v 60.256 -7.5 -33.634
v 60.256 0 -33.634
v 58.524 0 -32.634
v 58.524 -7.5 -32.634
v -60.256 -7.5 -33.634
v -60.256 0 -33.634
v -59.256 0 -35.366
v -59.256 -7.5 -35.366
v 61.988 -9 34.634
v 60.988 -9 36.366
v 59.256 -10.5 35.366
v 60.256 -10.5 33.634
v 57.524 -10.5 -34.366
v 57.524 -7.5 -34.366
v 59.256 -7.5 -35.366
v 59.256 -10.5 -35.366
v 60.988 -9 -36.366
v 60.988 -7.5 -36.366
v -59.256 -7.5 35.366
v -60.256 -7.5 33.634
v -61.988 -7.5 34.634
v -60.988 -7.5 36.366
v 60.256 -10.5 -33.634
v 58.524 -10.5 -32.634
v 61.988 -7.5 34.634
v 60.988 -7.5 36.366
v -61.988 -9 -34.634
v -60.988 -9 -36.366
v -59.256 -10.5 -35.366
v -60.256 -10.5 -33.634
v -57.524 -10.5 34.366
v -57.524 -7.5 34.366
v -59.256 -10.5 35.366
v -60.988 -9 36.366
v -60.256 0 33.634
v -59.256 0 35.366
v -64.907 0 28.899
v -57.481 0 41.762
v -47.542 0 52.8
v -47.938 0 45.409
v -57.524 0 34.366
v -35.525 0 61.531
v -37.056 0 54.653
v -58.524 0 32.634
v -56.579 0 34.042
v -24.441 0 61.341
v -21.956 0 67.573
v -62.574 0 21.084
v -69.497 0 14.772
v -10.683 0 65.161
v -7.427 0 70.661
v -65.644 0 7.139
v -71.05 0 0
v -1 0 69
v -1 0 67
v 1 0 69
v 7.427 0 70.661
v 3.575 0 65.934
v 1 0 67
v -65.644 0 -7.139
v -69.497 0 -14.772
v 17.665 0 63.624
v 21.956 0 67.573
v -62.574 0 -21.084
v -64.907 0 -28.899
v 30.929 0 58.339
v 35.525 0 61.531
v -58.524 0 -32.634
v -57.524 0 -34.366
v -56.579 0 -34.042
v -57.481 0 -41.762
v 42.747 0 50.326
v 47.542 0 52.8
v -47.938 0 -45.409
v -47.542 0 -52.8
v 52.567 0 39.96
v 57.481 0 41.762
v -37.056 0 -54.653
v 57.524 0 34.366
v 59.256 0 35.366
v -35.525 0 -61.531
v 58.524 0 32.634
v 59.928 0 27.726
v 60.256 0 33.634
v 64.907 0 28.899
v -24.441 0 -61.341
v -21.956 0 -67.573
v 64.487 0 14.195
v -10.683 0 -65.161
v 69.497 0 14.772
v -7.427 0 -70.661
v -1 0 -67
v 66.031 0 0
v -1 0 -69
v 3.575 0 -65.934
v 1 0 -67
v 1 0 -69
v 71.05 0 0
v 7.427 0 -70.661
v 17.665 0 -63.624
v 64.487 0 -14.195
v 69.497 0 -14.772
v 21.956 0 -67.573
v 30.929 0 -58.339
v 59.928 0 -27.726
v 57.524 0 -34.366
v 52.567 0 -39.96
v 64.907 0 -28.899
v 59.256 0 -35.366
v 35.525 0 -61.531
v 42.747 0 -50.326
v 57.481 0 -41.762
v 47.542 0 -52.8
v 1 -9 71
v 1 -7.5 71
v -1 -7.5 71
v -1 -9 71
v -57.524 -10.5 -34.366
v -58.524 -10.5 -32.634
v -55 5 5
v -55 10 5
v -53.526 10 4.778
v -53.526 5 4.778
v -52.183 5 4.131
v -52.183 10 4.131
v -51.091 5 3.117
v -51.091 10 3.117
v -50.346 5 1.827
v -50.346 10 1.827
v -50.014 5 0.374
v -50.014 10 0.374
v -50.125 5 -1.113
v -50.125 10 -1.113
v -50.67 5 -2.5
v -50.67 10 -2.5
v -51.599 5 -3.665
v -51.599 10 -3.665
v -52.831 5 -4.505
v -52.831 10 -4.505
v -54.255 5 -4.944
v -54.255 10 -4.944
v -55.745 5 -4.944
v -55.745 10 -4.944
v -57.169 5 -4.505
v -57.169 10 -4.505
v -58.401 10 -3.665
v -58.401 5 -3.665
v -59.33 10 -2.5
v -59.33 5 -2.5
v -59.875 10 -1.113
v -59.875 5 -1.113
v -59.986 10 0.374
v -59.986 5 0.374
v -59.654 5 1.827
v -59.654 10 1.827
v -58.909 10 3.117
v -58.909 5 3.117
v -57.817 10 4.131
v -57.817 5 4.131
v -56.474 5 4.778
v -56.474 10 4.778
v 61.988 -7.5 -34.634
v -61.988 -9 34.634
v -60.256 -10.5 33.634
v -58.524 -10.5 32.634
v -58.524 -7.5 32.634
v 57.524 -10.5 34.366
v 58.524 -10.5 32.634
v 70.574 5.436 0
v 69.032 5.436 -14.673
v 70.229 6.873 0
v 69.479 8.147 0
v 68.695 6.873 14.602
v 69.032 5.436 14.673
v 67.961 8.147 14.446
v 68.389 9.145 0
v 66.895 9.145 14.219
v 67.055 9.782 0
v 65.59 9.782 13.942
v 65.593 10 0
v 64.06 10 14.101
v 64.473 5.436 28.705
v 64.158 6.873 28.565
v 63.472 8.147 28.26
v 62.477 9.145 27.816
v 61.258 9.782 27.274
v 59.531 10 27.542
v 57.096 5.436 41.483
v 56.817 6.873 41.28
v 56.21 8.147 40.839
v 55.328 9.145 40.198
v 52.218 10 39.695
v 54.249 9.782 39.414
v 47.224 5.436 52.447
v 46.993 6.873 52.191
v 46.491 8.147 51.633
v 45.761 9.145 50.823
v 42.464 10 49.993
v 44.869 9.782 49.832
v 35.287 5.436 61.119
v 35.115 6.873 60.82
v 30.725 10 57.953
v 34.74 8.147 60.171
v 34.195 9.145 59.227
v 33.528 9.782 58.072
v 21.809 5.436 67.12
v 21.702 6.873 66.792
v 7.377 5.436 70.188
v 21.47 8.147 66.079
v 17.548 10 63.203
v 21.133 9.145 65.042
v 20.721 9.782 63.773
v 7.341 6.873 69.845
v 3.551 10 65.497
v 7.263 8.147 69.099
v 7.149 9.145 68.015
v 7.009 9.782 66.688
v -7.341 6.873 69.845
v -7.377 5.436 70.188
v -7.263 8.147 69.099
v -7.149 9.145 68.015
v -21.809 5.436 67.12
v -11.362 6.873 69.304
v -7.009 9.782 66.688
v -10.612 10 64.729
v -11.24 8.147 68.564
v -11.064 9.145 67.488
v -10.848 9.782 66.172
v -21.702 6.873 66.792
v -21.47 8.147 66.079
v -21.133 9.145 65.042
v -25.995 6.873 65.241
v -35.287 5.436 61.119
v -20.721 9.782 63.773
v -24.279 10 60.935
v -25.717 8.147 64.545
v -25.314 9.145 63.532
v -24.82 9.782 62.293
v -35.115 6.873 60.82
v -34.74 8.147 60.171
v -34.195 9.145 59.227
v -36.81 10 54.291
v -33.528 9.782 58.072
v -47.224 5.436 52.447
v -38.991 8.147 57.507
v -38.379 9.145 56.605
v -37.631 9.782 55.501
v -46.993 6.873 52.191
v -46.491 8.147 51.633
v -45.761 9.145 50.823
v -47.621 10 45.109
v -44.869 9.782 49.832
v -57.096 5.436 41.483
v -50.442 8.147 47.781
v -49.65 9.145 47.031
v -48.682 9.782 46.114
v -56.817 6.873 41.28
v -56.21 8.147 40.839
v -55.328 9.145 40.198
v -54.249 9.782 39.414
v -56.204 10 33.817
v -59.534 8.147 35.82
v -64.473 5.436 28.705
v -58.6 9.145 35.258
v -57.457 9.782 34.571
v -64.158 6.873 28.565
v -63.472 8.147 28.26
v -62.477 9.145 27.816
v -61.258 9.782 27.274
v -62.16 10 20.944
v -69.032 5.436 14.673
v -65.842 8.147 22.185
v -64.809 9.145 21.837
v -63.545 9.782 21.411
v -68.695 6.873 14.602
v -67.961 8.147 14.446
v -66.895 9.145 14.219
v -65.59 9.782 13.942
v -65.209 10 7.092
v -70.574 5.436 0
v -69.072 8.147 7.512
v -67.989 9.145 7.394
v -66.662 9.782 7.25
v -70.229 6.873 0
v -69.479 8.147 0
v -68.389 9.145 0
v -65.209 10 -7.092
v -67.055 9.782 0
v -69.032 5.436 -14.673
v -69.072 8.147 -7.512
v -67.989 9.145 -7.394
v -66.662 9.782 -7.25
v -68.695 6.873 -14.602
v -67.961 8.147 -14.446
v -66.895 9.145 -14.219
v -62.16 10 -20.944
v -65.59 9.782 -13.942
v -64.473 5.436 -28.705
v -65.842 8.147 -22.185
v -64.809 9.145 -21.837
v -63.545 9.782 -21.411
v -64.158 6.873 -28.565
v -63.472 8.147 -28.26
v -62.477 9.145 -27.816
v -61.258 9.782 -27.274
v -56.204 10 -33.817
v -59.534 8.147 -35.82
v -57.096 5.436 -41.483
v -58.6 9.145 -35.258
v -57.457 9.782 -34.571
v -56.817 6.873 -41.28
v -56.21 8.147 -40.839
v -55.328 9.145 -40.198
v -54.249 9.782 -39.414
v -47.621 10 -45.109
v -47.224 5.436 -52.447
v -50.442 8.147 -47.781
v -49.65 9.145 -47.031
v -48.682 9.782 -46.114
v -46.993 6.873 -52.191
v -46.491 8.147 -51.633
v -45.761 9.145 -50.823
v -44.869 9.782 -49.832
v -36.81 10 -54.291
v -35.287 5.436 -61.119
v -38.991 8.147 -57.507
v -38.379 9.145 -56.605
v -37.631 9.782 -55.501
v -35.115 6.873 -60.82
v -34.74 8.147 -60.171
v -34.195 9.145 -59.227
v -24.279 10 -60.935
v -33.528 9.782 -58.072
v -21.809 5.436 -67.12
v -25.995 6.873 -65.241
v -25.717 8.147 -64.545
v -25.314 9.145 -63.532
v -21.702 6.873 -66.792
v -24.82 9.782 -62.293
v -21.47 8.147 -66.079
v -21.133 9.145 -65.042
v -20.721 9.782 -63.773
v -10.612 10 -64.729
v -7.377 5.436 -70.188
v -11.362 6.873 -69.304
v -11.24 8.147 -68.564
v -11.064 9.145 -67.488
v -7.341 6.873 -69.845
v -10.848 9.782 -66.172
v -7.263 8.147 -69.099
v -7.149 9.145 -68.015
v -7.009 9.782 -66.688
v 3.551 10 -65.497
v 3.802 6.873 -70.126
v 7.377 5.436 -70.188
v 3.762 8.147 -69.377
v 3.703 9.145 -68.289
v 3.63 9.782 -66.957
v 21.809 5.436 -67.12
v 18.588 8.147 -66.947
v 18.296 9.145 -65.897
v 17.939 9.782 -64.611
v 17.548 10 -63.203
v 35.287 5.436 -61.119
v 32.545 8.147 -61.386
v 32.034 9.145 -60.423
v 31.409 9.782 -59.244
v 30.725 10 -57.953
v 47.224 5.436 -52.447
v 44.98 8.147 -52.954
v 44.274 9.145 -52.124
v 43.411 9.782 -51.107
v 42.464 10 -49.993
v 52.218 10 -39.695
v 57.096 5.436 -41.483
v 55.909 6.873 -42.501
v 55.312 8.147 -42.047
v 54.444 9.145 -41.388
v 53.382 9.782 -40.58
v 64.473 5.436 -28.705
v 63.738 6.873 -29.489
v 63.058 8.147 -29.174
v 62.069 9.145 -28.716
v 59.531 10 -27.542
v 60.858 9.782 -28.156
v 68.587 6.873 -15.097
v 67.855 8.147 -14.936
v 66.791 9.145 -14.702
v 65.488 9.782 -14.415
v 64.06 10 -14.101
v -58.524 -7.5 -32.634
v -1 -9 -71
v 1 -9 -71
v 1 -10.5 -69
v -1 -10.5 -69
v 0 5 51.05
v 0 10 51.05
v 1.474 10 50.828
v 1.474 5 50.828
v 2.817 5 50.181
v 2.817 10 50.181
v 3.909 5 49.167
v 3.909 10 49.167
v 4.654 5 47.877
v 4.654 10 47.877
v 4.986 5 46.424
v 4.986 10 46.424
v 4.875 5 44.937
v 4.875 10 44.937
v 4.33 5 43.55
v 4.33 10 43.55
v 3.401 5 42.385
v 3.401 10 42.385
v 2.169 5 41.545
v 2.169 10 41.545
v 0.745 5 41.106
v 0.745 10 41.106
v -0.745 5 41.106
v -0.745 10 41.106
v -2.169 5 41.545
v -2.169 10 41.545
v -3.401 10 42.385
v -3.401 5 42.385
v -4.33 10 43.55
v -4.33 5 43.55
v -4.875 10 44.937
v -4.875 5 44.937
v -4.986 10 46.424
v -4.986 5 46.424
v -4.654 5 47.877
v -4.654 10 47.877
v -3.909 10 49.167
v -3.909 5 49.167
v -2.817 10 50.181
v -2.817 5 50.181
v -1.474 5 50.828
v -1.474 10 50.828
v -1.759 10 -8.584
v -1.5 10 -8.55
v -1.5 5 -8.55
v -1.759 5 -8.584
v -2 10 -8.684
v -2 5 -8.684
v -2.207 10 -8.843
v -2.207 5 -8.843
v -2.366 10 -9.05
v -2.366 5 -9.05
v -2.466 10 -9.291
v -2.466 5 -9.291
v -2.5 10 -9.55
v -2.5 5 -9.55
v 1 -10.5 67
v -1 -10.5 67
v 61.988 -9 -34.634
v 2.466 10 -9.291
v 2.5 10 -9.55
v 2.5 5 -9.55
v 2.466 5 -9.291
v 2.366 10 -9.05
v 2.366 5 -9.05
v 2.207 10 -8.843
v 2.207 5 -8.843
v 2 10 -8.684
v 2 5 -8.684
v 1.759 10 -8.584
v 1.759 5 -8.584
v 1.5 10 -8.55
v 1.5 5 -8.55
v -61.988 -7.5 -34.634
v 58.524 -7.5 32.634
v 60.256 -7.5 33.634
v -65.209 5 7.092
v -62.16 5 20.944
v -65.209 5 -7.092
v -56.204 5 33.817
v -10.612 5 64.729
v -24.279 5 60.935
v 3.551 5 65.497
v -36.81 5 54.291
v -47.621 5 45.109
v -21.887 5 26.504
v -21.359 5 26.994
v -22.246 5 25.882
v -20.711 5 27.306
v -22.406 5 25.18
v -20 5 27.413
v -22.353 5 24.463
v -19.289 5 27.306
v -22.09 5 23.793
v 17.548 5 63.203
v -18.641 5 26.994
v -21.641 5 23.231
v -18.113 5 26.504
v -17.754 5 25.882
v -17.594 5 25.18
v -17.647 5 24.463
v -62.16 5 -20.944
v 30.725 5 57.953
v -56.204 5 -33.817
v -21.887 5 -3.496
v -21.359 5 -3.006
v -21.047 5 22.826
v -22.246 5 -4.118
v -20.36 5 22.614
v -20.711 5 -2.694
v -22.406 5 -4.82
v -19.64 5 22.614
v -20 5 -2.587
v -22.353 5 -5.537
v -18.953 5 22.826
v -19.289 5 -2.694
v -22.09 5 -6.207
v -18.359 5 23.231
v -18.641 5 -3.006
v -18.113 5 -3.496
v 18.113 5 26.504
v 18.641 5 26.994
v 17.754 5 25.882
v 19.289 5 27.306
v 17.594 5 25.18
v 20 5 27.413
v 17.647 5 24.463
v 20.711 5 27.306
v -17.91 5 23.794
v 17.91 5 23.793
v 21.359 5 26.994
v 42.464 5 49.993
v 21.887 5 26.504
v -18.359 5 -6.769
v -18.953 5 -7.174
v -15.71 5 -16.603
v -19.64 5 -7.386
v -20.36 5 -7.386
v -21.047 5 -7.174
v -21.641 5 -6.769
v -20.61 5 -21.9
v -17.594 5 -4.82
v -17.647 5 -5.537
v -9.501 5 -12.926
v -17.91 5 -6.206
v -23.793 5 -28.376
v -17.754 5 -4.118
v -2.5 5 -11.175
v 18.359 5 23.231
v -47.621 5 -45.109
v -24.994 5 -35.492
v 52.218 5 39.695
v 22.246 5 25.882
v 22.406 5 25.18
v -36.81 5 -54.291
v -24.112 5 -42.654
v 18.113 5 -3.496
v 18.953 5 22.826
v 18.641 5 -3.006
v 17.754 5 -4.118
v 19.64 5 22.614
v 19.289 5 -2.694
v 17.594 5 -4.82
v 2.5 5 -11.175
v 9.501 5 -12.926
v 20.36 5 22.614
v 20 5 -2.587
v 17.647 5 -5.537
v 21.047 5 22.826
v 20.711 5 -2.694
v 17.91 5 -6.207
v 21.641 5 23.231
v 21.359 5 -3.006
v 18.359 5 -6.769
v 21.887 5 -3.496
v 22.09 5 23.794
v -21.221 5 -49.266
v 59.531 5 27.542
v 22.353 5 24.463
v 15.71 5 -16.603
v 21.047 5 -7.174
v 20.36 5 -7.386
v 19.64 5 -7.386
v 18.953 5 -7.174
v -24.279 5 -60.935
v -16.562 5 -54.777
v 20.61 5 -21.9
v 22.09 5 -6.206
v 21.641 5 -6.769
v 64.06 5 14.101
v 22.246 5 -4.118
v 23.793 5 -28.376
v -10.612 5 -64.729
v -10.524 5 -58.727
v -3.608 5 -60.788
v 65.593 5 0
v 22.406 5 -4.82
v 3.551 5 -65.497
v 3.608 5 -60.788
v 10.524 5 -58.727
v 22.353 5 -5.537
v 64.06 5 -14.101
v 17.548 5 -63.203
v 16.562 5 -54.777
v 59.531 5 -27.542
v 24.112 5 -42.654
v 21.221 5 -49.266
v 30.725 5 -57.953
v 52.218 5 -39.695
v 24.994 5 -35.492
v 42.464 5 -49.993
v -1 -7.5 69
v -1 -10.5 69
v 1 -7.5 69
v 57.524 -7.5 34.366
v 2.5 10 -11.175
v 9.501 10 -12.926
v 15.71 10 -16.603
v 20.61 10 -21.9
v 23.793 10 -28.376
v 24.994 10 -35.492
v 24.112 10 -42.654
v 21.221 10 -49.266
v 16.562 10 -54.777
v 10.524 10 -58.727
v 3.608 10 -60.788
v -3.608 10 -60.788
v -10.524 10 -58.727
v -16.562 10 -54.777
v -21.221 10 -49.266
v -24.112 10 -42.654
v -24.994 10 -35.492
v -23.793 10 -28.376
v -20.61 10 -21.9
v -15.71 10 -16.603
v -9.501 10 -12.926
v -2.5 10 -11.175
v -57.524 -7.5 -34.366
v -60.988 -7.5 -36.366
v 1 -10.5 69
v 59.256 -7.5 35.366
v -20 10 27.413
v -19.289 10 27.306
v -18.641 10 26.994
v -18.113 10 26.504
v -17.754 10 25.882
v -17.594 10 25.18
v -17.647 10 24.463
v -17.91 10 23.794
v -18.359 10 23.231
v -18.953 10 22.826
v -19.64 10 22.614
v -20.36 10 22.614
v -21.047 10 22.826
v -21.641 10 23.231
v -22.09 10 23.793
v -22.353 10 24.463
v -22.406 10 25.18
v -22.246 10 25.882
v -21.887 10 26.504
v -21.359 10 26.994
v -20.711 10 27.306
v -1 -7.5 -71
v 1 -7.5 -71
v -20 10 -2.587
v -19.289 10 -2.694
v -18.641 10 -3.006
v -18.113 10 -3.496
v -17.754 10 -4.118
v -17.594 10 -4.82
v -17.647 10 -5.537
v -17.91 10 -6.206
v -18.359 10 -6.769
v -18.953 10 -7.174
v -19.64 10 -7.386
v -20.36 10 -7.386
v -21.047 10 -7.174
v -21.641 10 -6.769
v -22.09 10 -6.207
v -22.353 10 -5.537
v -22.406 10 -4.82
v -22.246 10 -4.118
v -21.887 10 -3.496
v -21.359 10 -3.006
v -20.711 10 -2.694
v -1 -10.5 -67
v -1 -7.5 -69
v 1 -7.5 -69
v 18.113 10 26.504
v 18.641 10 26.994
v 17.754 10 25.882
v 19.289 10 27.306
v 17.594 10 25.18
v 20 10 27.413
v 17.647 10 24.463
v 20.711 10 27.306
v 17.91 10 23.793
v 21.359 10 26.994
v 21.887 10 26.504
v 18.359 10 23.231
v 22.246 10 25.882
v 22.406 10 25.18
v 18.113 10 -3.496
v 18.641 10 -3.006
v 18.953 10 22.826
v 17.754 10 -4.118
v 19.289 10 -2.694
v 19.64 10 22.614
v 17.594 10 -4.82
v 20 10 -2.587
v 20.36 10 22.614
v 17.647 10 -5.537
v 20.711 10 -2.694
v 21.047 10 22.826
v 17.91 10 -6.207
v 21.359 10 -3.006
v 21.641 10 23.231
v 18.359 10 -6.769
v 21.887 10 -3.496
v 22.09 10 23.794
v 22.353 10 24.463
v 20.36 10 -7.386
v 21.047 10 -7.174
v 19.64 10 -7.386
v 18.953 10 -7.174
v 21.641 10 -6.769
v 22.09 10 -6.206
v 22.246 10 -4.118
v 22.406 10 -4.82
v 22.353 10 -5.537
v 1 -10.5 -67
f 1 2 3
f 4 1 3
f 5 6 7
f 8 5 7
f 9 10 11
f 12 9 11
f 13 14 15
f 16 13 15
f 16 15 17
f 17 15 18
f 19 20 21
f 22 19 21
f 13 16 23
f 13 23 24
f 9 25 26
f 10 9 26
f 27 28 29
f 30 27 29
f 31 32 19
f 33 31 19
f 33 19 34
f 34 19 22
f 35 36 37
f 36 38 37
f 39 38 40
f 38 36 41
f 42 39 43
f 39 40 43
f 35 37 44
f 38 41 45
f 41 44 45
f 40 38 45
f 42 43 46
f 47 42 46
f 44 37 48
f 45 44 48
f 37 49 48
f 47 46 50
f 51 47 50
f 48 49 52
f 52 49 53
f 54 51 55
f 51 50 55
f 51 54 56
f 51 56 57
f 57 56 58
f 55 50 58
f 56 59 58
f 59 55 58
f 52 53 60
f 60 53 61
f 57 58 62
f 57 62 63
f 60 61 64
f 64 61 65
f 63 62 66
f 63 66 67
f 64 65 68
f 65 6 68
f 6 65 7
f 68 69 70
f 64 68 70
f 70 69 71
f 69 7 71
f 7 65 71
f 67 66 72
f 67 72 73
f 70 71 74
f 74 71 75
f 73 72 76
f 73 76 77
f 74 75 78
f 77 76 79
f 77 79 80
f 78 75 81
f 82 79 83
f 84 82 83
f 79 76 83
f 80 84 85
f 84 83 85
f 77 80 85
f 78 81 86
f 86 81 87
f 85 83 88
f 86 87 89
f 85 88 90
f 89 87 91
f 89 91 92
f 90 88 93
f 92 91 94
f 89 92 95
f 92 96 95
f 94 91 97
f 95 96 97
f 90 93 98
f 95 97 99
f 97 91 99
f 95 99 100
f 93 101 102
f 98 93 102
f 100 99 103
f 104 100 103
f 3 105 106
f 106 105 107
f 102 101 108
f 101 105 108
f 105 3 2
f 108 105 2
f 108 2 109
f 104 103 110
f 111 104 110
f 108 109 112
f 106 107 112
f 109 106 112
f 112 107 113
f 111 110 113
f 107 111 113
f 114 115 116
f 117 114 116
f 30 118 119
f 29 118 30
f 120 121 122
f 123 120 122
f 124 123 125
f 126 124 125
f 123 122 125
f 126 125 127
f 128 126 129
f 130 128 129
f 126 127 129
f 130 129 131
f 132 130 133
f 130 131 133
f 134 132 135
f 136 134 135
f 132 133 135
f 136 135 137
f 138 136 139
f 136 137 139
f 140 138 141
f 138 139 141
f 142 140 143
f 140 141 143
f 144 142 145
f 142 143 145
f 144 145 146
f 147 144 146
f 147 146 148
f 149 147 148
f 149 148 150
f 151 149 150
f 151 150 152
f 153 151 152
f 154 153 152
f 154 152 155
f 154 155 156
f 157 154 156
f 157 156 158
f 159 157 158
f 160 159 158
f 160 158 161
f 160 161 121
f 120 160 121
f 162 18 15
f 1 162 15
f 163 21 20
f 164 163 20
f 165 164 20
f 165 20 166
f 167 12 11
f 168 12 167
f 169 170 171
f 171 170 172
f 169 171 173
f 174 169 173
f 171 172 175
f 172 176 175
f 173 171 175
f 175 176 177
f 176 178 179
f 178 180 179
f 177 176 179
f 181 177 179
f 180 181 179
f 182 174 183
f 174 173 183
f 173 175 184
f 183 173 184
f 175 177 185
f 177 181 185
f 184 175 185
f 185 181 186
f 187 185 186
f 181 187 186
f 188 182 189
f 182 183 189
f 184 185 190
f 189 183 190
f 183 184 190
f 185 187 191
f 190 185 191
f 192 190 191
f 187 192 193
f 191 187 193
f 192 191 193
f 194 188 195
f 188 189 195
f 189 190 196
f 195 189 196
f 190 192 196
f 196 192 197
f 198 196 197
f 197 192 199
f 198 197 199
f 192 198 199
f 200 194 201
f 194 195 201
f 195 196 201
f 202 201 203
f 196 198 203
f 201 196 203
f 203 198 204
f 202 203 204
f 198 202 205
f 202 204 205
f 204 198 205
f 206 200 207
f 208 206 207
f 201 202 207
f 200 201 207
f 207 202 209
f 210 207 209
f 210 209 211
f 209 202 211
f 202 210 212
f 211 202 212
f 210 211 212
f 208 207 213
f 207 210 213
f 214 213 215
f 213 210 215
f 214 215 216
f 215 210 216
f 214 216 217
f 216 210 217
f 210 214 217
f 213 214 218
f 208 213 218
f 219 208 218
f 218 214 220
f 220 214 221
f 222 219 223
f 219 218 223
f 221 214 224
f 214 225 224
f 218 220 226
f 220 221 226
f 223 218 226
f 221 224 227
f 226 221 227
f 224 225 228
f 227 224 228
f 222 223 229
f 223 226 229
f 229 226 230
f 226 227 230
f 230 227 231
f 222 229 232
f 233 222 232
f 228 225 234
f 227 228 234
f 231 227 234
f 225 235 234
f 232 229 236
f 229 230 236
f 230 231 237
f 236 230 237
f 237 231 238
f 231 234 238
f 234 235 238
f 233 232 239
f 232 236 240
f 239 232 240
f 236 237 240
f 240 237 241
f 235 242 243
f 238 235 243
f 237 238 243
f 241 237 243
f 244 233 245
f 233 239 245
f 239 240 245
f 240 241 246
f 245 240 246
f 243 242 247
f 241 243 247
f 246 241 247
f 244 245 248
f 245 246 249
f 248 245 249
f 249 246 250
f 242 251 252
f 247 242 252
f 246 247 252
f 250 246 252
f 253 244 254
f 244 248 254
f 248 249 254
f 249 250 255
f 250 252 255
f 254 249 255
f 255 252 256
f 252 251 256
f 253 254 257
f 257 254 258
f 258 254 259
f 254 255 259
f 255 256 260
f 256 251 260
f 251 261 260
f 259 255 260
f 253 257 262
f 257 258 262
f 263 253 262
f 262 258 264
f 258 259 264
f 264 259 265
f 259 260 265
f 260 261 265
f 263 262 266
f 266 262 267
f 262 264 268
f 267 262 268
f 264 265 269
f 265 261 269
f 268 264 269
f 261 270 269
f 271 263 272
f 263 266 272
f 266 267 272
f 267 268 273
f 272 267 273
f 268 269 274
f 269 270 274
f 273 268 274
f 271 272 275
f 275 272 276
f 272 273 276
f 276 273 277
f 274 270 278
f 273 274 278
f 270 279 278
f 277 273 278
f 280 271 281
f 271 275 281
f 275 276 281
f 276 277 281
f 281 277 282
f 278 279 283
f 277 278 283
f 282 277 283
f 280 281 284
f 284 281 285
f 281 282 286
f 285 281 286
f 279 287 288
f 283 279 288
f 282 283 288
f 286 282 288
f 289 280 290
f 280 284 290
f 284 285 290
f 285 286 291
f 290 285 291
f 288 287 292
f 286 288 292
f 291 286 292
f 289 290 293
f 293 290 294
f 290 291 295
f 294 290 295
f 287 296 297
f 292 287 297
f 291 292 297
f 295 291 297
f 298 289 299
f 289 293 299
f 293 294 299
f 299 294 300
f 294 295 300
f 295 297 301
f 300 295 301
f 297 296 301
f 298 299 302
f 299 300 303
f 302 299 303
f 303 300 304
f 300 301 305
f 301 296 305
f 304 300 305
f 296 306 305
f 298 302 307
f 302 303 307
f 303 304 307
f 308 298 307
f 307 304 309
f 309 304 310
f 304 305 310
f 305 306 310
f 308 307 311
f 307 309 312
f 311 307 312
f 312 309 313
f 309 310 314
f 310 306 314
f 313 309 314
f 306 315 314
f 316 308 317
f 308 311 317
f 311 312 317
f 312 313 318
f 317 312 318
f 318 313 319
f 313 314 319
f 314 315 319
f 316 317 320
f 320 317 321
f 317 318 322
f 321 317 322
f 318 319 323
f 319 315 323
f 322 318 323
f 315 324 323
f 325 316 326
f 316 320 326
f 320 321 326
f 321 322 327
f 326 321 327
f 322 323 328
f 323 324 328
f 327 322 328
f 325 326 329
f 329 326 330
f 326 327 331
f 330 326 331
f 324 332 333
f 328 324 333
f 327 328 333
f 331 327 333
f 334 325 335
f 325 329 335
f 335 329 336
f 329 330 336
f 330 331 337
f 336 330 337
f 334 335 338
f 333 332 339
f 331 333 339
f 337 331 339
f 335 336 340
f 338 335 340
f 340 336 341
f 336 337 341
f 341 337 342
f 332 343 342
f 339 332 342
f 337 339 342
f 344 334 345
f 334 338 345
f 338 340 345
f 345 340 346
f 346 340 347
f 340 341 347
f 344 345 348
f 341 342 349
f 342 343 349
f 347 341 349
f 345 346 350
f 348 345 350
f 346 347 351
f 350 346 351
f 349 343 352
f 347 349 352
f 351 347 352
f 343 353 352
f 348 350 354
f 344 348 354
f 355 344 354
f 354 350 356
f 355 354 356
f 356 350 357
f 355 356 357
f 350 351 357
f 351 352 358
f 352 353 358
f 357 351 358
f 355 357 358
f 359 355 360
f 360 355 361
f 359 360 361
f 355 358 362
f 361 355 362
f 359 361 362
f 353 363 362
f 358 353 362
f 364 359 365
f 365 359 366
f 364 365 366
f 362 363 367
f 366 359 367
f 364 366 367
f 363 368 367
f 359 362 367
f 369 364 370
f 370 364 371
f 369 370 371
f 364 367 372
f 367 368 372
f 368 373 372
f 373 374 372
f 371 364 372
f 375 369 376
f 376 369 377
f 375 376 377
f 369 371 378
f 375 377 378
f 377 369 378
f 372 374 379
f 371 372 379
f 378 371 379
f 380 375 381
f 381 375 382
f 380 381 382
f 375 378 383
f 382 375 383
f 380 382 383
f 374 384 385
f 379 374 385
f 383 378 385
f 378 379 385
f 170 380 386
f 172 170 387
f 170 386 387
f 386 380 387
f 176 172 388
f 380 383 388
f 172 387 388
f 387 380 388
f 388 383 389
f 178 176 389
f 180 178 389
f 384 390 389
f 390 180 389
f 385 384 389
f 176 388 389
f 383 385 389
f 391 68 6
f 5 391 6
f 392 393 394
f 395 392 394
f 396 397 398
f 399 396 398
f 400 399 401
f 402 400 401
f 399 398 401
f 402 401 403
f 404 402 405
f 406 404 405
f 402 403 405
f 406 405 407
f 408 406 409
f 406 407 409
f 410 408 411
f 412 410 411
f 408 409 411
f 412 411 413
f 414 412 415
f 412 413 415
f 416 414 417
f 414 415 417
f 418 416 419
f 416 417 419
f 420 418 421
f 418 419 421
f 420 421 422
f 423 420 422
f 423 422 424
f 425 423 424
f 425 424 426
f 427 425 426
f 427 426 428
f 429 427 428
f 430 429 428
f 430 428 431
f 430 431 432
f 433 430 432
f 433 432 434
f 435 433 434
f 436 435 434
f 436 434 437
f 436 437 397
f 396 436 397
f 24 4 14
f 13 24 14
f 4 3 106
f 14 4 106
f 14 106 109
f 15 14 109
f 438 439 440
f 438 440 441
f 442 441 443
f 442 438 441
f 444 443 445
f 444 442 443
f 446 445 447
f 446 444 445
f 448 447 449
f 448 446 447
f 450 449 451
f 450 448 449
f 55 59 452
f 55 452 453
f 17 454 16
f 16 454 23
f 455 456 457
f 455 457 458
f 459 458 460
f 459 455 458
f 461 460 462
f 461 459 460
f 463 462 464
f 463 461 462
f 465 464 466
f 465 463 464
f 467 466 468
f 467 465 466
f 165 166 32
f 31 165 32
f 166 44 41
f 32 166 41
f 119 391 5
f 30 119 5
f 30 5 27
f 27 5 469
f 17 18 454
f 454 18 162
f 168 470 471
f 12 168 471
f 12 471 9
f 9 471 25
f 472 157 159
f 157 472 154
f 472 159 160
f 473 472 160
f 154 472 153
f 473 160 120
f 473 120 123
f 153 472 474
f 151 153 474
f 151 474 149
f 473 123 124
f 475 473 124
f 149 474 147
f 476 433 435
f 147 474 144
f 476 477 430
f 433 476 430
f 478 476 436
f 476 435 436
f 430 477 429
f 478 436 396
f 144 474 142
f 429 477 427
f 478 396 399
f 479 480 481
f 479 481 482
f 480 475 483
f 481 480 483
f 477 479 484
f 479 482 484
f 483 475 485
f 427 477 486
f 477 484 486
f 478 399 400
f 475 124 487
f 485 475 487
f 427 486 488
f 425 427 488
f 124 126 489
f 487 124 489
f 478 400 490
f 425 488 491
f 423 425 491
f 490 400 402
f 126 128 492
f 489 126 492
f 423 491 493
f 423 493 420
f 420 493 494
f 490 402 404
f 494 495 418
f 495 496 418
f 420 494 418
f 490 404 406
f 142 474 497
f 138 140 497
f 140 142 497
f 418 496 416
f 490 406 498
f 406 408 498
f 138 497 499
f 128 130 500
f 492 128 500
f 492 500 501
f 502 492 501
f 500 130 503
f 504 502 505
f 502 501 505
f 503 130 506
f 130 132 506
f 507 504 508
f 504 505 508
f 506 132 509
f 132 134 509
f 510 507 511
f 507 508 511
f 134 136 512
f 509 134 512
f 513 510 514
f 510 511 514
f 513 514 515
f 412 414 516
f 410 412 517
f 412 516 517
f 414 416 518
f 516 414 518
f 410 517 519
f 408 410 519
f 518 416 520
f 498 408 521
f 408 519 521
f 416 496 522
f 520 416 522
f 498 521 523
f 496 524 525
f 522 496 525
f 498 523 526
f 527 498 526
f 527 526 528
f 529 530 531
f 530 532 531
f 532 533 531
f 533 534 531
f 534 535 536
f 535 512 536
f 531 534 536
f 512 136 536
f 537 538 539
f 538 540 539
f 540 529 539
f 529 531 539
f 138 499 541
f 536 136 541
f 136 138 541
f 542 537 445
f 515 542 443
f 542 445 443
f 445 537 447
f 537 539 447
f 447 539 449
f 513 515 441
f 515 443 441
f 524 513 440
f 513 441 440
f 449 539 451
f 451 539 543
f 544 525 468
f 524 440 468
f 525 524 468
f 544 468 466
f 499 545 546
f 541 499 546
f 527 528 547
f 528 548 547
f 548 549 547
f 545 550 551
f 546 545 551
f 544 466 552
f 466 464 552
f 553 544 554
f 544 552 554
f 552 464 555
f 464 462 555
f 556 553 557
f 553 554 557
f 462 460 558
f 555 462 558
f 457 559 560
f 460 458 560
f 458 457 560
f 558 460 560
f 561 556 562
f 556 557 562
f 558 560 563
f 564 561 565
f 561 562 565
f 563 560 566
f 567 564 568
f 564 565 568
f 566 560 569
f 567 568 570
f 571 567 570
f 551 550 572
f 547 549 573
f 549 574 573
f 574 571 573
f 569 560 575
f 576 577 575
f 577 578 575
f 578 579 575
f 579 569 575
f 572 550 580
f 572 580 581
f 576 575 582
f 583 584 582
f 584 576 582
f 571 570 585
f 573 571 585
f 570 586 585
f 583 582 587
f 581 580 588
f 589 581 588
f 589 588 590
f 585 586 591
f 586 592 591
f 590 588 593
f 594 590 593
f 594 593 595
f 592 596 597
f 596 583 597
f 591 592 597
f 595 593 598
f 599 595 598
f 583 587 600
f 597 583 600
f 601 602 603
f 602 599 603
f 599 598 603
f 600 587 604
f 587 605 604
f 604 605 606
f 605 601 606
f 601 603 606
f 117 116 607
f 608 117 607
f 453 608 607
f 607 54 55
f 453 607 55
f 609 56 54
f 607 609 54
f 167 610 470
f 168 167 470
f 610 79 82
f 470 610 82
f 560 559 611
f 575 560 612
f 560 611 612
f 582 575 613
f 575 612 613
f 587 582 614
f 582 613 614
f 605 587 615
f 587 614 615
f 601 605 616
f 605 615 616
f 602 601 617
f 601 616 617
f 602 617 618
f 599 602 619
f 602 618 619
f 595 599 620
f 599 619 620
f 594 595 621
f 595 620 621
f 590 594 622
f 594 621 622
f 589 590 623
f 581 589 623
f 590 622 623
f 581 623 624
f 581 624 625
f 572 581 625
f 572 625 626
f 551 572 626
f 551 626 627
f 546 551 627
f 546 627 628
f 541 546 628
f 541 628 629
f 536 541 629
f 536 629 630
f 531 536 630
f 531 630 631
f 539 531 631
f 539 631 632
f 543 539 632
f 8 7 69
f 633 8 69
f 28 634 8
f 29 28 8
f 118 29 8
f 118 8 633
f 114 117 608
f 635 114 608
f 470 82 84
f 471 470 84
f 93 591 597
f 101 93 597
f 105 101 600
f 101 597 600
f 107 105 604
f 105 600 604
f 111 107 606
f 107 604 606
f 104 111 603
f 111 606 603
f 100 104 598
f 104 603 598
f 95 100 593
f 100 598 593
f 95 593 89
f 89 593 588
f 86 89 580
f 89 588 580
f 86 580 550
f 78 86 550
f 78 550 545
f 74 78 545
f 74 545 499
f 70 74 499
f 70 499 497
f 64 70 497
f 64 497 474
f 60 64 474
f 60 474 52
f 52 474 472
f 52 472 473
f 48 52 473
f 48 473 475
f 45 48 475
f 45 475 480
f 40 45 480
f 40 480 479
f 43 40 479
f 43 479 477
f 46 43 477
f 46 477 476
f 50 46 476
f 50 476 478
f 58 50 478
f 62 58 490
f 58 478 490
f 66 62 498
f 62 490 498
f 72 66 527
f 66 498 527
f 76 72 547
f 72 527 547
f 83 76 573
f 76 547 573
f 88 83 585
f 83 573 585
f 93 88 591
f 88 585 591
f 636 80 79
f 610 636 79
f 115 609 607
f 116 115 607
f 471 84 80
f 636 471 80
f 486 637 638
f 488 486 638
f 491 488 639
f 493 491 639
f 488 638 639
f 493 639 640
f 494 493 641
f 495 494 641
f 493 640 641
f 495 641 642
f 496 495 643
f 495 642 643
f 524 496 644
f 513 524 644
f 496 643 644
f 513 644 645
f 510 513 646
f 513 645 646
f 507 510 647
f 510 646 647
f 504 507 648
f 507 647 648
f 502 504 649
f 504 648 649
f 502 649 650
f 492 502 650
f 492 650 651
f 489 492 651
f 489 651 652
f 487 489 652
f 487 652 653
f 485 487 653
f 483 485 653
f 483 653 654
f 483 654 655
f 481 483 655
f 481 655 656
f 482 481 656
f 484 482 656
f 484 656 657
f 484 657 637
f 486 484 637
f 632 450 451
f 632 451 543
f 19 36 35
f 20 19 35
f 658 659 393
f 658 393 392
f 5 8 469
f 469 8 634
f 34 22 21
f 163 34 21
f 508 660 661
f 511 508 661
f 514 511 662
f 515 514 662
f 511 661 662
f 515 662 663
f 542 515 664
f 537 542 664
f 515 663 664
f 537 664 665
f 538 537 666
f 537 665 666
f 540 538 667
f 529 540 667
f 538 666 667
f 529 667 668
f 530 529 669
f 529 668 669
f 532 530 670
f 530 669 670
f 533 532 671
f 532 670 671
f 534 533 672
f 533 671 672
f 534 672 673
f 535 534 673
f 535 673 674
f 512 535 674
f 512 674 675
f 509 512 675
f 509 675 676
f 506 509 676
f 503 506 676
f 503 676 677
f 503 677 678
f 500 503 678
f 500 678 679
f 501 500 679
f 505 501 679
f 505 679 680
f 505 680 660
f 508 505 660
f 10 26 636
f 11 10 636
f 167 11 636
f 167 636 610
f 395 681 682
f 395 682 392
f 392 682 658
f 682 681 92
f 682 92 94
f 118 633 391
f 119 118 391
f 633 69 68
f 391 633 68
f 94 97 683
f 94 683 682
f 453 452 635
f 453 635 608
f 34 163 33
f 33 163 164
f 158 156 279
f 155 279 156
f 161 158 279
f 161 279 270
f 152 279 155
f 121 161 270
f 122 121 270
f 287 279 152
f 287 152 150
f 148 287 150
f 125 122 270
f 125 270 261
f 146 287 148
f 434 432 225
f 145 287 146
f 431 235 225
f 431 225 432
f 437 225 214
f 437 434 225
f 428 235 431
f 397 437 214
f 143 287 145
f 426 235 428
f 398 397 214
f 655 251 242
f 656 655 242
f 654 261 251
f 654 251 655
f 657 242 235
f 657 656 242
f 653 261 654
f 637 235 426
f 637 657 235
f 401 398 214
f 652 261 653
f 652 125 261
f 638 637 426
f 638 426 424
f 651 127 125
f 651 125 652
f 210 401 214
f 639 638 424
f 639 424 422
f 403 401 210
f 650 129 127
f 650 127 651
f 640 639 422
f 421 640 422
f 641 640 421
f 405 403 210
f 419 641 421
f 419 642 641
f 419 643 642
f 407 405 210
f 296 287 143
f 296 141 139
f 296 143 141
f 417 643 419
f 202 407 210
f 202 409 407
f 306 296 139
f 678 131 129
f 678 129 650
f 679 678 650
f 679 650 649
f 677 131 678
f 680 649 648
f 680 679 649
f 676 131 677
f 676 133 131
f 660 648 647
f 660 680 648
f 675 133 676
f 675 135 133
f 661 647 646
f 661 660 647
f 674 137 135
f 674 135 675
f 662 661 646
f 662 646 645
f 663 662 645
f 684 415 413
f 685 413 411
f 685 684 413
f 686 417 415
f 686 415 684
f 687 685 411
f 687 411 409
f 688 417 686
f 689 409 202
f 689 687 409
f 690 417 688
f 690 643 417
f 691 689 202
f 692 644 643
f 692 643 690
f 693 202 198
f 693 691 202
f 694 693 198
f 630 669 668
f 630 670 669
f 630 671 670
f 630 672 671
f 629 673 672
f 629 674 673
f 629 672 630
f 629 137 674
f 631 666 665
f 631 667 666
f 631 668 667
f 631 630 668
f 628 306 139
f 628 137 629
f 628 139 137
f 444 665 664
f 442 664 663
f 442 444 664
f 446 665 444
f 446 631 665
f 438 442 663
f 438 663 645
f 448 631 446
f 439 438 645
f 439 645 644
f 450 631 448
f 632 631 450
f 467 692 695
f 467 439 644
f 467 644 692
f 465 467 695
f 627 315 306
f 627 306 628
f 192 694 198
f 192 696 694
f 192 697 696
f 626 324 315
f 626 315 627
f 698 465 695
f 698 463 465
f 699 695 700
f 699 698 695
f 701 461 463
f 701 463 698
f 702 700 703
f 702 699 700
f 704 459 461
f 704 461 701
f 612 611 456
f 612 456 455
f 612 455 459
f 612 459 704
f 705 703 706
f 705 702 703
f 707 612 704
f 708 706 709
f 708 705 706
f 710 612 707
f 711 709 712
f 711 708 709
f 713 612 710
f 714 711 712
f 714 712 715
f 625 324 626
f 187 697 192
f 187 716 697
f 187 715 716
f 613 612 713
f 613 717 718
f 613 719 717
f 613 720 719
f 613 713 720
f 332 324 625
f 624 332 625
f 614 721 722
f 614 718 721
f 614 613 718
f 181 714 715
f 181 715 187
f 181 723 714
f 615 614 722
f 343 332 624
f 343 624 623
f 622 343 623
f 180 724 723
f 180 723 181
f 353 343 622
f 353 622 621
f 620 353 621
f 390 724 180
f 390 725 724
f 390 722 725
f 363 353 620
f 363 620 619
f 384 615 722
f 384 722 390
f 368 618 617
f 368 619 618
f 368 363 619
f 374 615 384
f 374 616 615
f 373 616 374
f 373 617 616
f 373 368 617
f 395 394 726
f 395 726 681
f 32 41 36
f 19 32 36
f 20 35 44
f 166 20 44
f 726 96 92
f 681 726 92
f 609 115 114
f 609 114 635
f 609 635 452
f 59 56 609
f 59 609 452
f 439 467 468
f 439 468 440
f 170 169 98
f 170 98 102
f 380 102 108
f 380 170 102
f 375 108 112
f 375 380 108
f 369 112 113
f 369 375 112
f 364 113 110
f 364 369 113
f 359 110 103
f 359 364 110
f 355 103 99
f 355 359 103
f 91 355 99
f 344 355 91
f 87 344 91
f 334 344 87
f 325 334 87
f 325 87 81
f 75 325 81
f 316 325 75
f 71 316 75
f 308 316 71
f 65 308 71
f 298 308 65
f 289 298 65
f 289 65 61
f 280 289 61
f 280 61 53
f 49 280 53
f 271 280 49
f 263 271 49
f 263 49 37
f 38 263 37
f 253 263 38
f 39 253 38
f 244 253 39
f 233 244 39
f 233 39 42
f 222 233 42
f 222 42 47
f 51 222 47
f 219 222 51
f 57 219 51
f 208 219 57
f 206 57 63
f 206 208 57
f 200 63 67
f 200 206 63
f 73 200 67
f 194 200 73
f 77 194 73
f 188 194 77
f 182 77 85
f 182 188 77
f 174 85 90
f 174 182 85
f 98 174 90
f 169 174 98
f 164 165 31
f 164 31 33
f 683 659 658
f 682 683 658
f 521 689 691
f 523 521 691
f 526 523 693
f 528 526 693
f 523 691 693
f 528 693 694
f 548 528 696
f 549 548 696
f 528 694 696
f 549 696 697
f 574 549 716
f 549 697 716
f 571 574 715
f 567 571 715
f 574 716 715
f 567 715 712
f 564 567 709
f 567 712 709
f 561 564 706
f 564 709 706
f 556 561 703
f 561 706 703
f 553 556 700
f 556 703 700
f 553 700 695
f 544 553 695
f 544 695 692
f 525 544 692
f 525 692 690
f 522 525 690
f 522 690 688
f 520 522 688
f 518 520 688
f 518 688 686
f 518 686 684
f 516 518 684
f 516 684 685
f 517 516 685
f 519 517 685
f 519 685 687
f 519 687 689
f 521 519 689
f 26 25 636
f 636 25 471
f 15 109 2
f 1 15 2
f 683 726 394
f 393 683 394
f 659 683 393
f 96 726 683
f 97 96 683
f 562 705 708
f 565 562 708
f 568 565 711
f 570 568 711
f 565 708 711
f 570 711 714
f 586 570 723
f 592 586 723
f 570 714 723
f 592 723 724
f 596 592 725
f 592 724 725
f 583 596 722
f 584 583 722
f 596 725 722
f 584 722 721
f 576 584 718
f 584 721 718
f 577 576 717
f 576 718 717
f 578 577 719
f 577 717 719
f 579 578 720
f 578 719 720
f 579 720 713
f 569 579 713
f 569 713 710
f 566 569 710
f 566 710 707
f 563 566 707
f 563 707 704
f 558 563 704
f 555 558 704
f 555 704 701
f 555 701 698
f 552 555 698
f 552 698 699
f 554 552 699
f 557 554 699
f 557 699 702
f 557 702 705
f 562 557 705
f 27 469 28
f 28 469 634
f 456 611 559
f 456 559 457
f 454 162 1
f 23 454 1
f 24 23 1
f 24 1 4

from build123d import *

# Parameters (mm, degrees)
SKETCH1_R           = 71.05
BOSS_EXTRUDE1_DEPTH = 10
BOSS_EXTRUDE1_TAPER = 5
SHELL4_T            = -5
SKETCH2_R           = 5
SKETCH2_R_2         = 25
SKETCH2_R_3         = 2.413
CUT_EXTRUDE1_DEPTH  = 101.976259737
CUT_EXTRUDE4_DEPTH  = 10
FILLET2_R           = 5
SKETCH11_R          = 5
CUT_EXTRUDE8_DEPTH  = 101.976259737
SKETCH12_W          = 2
SKETCH12_H          = 2
BOSS_EXTRUDE4_DEPTH = 7.5
SKETCH13_W          = 2
SKETCH13_H          = 4
BOSS_EXTRUDE5_DEPTH = 3
CUT_EXTRUDE9_DEPTH  = 3
CUT_EXTRUDE10_DEPTH = 3
CUT_EXTRUDE11_DEPTH = 3
CUT_EXTRUDE12_DEPTH = 3
CUT_EXTRUDE13_DEPTH = 3
CUT_EXTRUDE14_DEPTH = 3


with BuildPart() as part:
    # Sketch1 → Boss-Extrude1 (new body)
    with BuildSketch(Plane(origin=(0, 0, 0), x_dir=(1, 0, 0), z_dir=(0, 1, 0))):
        Circle(SKETCH1_R)
    extrude(amount=BOSS_EXTRUDE1_DEPTH, taper=BOSS_EXTRUDE1_TAPER)

    # Shell4
    shell4_openings = [part.faces().sort_by_distance(p)[0] for p in [
        (0, 0, 0),
    ]]
    offset(amount=SHELL4_T, openings=shell4_openings, kind=Kind.INTERSECTION)

    # Sketch2 → Cut-Extrude1 (cut, through all)
    with BuildSketch(Plane(origin=(0, 10, 0), x_dir=(1, 0, 0), z_dir=(0, 1, 0))):
        with Locations(Location((0, -46.05, 0), (0, 0, 270))):
            Circle(SKETCH2_R)
        with Locations(Location((0, 36.05, 0), (0, 0, 270))):
            Circle(SKETCH2_R_2)
        with Locations(Location((20, 5, 0), (0, 0, 270))):
            Circle(SKETCH2_R_3)
        with Locations(Location((20, -25, 0), (0, 0, 270))):
            Circle(SKETCH2_R_3)
        with Locations(Location((-20, -25, 0), (0, 0, 270))):
            Circle(SKETCH2_R_3)
        with Locations(Location((-20, 5, 0), (0, 0, 270))):
            Circle(SKETCH2_R_3)
    extrude(amount=-CUT_EXTRUDE1_DEPTH, mode=Mode.SUBTRACT)

    # Sketch6 → Cut-Extrude4 (cut)
    with BuildSketch(Plane(origin=(0, 10, 0), x_dir=(1, 0, 0), z_dir=(0, 1, 0))):
        with BuildLine():
            Line((-2.5, 14.187111582), (2.5, 14.187111582))
            Line((2.5, 14.187111582), (2.5, 9.55))
            ThreePointArc((2.5, 9.55), (2.207106781, 8.842893219), (1.5, 8.55))
            Line((1.5, 8.55), (-1.5, 8.55))
            ThreePointArc((-1.5, 8.55), (-2.207106781, 8.842893219), (-2.5, 9.55))
            Line((-2.5, 9.55), (-2.5, 14.187111582))
        make_face()
    extrude(amount=-CUT_EXTRUDE4_DEPTH, mode=Mode.SUBTRACT)

    # Fillet2
    fillet2_edges = [part.edges().sort_by_distance(p)[0] for p in [
        (-70.175113365, 10, 0),
    ]]
    fillet(fillet2_edges, radius=FILLET2_R)

    # Sketch11 → Cut-Extrude8 (cut, through all)
    with BuildSketch(Plane(origin=(0, 10, 0), x_dir=(1, 0, 0), z_dir=(0, 1, 0))):
        with Locations(Location((-55, 0, 0), (0, 0, 270))):
            Circle(SKETCH11_R)
    extrude(amount=-CUT_EXTRUDE8_DEPTH, mode=Mode.SUBTRACT)

    # Sketch12 → Boss-Extrude4 (add)
    with BuildSketch(Plane(origin=(0, 0, 0), x_dir=(-1, 0, 0), z_dir=(0, -1, 0))):
        Polygon((58.523702054, 32.633974596), (60.255752861, 33.633974596), (59.255752861, 35.366025404), (57.523702054, 34.366025404), align=None)
        with Locations((0, 68)):
            Rectangle(SKETCH12_W, SKETCH12_H)
        Polygon((57.523702054, -34.366025404), (59.255752861, -35.366025404), (60.255752861, -33.633974596), (58.523702054, -32.633974596), align=None)
        with Locations((0, -68)):
            Rectangle(SKETCH12_W, SKETCH12_H)
        Polygon((-58.523702054, -32.633974596), (-60.255752861, -33.633974596), (-59.255752861, -35.366025404), (-57.523702054, -34.366025404), align=None)
        Polygon((-57.523702054, 34.366025404), (-59.255752861, 35.366025404), (-60.255752861, 33.633974596), (-58.523702054, 32.633974596), align=None)
    extrude(amount=BOSS_EXTRUDE4_DEPTH)

    # Sketch13 → Boss-Extrude5 (add)
    with BuildSketch(Plane(origin=(0, -7.5, 0), x_dir=(-1, 0, 0), z_dir=(0, -1, 0))):
        Polygon((-58.523702054, -32.633974596), (-61.987803669, -34.633974596), (-60.987803669, -36.366025404), (-57.523702054, -34.366025404), align=None)
        with Locations((0, -69)):
            Rectangle(SKETCH13_W, SKETCH13_H)
        Polygon((-57.523702054, 34.366025404), (-60.987803669, 36.366025404), (-61.987803669, 34.633974596), (-58.523702054, 32.633974596), align=None)
        with Locations((0, 69)):
            Rectangle(SKETCH13_W, SKETCH13_H)
        Polygon((58.523702054, 32.633974596), (61.987803669, 34.633974596), (60.987803669, 36.366025404), (57.523702054, 34.366025404), align=None)
        Polygon((57.523702054, -34.366025404), (60.987803669, -36.366025404), (61.987803669, -34.633974596), (58.523702054, -32.633974596), align=None)
    extrude(amount=BOSS_EXTRUDE5_DEPTH)

    # Sketch14 → Cut-Extrude9 (cut)
    with BuildSketch(Plane(origin=(1, 0, 0), x_dir=(0, 0, -1), z_dir=(1, 0, 0))):
        Polygon((71, -9), (69, -10.5), (71, -10.5), align=None)
    extrude(amount=-CUT_EXTRUDE9_DEPTH, mode=Mode.SUBTRACT)

    # Sketch16 → Cut-Extrude10 (cut)
    with BuildSketch(Plane(origin=(0.5000000000007515, 0, 0.8660254037857402), x_dir=(0.8660254037844386, 0, -0.4999999999999999), z_dir=(0.49999999999999994, 0, 0.8660254037844387))):
        Polygon((71, -9), (69, -10.5), (71, -10.5), align=None)
    extrude(amount=-CUT_EXTRUDE10_DEPTH, mode=Mode.SUBTRACT)

    # Sketch17 → Cut-Extrude11 (cut)
    with BuildSketch(Plane(origin=(-0.5000000000021357, 0, 0.8660254037881377), x_dir=(0.8660254037844386, 0, 0.4999999999999999), z_dir=(-0.49999999999999994, 0, 0.8660254037844387))):
        Polygon((71, -9), (69, -10.5), (71, -10.5), align=None)
    extrude(amount=-CUT_EXTRUDE11_DEPTH, mode=Mode.SUBTRACT)

    # Sketch18 → Cut-Extrude12 (cut)
    with BuildSketch(Plane.ZY.offset(1)):
        Polygon((71, -9), (69, -10.5), (71, -10.5), align=None)
    extrude(amount=-CUT_EXTRUDE12_DEPTH, mode=Mode.SUBTRACT)

    # Sketch19 → Cut-Extrude13 (cut)
    with BuildSketch(Plane(origin=(-0.5000000000020854, 0, -0.8660254037880506), x_dir=(-0.8660254037844386, 0, 0.4999999999999999), z_dir=(-0.49999999999999994, 0, -0.8660254037844387))):
        Polygon((71, -9), (69, -10.5), (71, -10.5), align=None)
    extrude(amount=-CUT_EXTRUDE13_DEPTH, mode=Mode.SUBTRACT)

    # Sketch20 → Cut-Extrude14 (cut)
    with BuildSketch(Plane(origin=(0.5000000000006769, 0, -0.8660254037856109), x_dir=(-0.8660254037844386, 0, -0.4999999999999999), z_dir=(0.49999999999999994, 0, -0.8660254037844387))):
        Polygon((71, -9), (69, -10.5), (71, -10.5), align=None)
    extrude(amount=-CUT_EXTRUDE14_DEPTH, mode=Mode.SUBTRACT)


solid = part.part
